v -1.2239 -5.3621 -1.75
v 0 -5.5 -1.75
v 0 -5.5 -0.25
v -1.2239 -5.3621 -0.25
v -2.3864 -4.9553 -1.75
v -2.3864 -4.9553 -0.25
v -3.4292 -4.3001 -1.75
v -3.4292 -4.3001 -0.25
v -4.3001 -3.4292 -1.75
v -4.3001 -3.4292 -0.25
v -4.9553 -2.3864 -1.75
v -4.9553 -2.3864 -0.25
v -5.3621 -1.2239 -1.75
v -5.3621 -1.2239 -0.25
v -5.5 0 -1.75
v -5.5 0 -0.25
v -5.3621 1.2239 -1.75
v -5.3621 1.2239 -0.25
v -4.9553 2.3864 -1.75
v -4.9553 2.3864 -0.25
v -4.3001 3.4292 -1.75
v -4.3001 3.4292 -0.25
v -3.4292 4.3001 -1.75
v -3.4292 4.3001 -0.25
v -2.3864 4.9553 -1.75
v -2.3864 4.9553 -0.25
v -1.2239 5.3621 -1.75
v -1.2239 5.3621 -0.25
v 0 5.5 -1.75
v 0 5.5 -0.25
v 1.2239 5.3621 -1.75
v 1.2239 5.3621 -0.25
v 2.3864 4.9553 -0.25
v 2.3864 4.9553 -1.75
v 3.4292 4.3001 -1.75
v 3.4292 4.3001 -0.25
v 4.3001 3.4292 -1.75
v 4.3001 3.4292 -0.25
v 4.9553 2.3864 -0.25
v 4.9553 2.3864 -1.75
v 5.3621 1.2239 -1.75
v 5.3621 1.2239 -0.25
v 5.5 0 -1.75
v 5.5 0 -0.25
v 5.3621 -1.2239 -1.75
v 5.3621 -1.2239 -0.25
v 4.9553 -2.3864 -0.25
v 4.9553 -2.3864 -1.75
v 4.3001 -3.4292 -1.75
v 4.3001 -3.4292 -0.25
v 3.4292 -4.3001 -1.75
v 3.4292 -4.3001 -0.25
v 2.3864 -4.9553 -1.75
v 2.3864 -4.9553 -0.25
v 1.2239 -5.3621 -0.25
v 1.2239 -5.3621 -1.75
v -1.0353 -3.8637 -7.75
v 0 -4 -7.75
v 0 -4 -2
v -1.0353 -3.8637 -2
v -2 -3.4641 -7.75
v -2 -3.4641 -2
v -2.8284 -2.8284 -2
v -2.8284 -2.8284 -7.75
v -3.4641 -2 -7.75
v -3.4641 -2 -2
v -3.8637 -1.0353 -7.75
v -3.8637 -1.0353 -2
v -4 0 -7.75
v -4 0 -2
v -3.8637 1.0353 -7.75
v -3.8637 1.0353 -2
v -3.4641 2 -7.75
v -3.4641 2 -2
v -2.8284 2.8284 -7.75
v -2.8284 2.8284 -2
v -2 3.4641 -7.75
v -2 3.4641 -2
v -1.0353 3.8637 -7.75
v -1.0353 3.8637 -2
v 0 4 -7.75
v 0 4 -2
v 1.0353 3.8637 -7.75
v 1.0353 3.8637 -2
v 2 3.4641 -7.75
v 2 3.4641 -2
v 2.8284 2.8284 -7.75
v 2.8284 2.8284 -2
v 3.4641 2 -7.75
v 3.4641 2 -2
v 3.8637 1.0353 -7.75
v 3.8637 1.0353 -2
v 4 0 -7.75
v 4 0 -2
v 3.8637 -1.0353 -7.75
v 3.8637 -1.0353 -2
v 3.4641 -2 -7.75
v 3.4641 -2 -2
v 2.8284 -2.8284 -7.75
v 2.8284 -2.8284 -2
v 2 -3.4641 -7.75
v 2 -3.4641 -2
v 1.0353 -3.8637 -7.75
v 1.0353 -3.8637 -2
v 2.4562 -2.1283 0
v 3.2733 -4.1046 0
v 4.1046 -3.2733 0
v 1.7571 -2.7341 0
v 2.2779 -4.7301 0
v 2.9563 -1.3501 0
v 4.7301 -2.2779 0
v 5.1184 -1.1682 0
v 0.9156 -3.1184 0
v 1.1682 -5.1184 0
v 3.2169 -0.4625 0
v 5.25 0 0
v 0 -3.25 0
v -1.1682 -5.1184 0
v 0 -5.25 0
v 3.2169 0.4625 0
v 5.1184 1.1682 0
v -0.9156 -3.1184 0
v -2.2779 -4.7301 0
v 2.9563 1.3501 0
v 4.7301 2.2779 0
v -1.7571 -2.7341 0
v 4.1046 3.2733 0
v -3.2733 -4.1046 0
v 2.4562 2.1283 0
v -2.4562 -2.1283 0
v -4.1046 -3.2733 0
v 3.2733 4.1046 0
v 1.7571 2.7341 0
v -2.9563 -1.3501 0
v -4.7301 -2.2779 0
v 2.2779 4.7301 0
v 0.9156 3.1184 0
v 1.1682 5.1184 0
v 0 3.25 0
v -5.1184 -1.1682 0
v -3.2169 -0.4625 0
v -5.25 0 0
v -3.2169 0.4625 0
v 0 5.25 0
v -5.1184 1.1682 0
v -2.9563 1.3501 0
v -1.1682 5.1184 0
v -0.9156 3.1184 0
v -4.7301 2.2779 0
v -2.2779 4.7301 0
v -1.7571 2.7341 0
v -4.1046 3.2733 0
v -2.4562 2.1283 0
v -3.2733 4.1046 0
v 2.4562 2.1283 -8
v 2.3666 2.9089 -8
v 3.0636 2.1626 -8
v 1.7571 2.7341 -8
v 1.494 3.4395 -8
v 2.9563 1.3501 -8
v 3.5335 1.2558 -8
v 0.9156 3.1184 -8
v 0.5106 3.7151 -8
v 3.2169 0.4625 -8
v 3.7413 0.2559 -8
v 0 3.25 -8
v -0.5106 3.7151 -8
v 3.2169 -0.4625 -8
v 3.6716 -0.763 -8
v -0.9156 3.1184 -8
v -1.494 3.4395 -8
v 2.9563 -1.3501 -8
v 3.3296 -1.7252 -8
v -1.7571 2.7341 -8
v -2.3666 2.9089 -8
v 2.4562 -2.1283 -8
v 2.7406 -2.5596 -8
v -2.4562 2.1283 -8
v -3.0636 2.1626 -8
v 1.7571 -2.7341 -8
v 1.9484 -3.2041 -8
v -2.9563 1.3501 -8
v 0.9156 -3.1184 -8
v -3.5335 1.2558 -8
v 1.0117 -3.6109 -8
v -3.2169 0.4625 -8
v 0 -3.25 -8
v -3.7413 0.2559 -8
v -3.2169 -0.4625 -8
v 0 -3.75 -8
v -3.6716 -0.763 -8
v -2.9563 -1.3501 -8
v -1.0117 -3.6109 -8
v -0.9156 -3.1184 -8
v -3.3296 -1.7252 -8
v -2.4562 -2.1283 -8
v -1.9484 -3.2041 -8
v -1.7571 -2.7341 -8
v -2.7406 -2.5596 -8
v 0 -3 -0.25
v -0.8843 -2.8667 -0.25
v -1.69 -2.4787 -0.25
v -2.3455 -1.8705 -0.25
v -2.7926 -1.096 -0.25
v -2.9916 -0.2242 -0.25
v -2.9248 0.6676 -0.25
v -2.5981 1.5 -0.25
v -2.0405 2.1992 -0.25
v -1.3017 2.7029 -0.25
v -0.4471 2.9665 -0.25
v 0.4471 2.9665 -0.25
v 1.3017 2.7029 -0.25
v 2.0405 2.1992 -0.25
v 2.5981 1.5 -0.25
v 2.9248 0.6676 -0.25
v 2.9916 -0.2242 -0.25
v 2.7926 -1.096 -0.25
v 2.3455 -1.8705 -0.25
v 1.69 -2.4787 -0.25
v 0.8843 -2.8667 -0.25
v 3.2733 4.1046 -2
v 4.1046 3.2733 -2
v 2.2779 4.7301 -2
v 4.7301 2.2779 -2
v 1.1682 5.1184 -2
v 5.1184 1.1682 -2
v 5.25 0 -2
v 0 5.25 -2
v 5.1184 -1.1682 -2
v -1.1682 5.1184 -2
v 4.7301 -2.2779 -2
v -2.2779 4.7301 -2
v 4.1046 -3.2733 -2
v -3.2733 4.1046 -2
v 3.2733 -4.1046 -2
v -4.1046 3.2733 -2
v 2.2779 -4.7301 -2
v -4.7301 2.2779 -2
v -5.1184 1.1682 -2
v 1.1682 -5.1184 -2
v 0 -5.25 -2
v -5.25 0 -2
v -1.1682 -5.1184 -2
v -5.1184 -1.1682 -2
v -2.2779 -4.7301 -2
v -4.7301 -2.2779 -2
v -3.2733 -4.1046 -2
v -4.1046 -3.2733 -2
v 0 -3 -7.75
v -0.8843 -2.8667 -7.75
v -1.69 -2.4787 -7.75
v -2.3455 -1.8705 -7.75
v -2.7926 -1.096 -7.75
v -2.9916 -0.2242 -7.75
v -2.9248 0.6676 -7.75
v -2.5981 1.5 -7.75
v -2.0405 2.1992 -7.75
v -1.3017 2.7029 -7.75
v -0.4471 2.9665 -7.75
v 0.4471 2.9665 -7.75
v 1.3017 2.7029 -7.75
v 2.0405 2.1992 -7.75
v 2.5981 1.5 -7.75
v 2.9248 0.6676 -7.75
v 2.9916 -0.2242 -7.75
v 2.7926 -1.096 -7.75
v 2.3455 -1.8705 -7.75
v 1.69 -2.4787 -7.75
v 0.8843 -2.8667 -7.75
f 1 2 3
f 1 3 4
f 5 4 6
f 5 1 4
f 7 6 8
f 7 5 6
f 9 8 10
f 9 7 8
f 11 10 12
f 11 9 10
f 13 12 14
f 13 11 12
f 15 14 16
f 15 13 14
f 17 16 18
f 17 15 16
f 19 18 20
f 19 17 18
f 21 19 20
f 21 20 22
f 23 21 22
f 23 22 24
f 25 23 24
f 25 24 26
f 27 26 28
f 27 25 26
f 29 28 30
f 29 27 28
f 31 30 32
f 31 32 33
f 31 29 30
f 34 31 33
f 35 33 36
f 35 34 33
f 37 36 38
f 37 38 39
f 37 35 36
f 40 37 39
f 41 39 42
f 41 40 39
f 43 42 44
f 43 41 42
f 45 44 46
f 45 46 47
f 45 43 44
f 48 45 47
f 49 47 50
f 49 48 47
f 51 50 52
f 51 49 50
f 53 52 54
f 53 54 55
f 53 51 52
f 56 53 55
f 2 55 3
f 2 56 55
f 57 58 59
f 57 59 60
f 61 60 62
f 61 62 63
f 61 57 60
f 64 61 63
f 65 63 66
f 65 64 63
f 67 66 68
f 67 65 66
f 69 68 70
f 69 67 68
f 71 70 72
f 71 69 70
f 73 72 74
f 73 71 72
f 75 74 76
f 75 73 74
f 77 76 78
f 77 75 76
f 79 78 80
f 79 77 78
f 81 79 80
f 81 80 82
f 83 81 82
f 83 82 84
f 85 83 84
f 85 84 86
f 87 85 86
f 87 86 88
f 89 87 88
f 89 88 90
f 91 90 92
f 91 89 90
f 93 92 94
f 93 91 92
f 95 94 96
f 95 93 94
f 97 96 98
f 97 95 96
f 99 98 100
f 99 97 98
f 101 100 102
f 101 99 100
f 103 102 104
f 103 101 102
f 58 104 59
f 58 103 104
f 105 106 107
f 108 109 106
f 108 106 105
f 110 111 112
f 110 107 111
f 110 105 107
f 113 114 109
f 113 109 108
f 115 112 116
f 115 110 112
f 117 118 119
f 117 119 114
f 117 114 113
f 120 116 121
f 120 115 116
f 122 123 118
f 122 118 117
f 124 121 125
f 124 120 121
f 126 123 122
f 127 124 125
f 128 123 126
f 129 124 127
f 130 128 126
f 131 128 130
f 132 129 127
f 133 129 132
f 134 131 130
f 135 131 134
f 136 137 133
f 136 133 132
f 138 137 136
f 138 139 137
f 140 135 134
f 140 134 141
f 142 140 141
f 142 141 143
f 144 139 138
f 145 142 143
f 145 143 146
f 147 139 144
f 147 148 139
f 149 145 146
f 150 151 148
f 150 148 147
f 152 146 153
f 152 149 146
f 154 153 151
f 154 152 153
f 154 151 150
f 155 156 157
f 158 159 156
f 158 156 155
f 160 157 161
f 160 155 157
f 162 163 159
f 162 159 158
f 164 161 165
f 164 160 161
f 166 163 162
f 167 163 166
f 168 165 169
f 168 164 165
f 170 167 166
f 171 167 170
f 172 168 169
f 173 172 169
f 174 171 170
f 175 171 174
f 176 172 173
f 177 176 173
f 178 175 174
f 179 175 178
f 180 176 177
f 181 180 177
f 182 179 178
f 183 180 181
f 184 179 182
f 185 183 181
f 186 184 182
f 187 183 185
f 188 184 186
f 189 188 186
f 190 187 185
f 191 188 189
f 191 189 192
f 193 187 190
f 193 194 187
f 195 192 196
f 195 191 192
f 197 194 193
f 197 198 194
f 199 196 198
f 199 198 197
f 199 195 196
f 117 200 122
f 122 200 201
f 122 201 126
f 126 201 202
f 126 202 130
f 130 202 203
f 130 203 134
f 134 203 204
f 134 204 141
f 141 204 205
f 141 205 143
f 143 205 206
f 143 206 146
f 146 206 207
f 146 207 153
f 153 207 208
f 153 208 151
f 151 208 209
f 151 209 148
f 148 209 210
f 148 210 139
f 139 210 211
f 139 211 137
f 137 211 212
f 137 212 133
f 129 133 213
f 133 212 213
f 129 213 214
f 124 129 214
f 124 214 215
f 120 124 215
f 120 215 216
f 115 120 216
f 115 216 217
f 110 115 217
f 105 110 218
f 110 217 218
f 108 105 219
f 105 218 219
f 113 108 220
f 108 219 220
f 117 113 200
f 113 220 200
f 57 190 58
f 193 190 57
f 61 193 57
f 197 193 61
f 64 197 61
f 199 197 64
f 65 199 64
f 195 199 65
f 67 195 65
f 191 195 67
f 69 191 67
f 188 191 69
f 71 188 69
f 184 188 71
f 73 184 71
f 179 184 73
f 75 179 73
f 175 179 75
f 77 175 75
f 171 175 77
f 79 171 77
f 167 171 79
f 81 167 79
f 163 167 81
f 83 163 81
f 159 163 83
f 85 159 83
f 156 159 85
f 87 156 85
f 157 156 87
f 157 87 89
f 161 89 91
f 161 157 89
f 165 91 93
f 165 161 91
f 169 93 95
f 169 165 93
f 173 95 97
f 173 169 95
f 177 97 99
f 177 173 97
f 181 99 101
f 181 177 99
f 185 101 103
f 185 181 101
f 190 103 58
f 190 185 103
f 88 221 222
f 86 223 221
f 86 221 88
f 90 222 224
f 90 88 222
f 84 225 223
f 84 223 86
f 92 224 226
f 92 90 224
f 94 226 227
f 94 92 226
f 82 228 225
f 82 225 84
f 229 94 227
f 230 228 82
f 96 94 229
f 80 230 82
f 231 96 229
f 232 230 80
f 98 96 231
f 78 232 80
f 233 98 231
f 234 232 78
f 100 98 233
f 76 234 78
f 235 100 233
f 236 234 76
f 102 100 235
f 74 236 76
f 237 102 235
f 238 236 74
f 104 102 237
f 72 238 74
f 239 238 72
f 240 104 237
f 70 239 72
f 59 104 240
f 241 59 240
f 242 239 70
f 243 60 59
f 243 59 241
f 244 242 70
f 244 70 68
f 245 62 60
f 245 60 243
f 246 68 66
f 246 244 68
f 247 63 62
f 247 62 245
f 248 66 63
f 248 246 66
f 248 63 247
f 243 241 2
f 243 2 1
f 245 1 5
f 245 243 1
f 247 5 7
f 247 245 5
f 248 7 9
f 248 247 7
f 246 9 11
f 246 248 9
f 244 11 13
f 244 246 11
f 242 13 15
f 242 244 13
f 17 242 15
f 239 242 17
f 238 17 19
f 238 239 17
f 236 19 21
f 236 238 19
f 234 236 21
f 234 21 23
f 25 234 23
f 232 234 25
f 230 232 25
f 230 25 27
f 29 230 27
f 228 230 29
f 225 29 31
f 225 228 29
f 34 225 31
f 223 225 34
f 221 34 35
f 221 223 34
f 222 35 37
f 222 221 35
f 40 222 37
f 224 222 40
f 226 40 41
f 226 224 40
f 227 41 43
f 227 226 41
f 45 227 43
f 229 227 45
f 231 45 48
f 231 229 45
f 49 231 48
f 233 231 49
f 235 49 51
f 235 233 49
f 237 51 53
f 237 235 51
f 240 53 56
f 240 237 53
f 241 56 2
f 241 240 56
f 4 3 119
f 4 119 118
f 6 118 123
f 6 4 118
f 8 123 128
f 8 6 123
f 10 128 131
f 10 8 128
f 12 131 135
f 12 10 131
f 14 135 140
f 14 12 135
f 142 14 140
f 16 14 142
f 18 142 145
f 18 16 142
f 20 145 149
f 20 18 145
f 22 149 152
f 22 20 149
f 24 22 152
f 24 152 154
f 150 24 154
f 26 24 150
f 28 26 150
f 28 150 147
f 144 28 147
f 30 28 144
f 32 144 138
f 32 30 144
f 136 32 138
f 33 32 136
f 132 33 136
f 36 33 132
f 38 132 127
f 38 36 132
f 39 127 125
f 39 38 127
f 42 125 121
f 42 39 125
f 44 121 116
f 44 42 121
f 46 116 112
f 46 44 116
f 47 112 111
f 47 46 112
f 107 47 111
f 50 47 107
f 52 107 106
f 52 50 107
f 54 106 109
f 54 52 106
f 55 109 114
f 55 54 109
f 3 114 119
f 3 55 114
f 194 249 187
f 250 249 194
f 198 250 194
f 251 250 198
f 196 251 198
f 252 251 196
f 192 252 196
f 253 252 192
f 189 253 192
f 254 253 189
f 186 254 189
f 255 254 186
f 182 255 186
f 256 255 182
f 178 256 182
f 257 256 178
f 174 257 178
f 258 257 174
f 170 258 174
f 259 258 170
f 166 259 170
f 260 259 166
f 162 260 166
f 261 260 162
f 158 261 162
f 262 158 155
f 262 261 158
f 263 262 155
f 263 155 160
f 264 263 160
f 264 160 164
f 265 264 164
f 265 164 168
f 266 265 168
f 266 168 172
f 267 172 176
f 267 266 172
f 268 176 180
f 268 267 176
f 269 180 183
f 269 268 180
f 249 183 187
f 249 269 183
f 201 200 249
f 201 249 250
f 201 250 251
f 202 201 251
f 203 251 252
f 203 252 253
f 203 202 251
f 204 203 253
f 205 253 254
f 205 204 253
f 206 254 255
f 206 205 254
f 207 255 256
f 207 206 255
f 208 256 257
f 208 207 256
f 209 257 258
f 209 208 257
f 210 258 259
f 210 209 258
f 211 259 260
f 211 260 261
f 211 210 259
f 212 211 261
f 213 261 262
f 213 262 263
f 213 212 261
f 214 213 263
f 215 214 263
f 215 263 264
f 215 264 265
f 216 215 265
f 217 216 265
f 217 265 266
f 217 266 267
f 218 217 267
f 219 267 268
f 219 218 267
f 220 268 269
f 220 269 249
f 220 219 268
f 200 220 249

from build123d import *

# Parameters (mm, degrees)
CHAMFER1_SIZE = 0.25


with BuildPart() as part:
    # Sketch1 → Revolve1 (revolve)
    with BuildSketch(Plane(origin=(0, 0, 0), x_dir=(0, 0, -1), z_dir=(1, 0, 0)), mode=Mode.PRIVATE) as revolve1_sk:
        Polygon((0, 3), (0, 5.5), (2, 5.5), (2, 4), (8, 4), (8, 3), align=None)
    revolve(revolve1_sk.sketch.rotate(Axis((0, 0, 0), (0, 0, -1)), 180), axis=Axis((0, 0, 0), (0, 0, -1)))  # turned: the seam where the file's is

    # Chamfer1
    chamfer1_edges = [part.edges().sort_by_distance(p)[0] for p in [
        (0, 3, -8),
        (0, 4, -8),
        (0, 5.5, -2),
        (0, 5.5, 0),
        (0, 3, 0),
    ]]
    chamfer(chamfer1_edges, length=CHAMFER1_SIZE)


solid = part.part
